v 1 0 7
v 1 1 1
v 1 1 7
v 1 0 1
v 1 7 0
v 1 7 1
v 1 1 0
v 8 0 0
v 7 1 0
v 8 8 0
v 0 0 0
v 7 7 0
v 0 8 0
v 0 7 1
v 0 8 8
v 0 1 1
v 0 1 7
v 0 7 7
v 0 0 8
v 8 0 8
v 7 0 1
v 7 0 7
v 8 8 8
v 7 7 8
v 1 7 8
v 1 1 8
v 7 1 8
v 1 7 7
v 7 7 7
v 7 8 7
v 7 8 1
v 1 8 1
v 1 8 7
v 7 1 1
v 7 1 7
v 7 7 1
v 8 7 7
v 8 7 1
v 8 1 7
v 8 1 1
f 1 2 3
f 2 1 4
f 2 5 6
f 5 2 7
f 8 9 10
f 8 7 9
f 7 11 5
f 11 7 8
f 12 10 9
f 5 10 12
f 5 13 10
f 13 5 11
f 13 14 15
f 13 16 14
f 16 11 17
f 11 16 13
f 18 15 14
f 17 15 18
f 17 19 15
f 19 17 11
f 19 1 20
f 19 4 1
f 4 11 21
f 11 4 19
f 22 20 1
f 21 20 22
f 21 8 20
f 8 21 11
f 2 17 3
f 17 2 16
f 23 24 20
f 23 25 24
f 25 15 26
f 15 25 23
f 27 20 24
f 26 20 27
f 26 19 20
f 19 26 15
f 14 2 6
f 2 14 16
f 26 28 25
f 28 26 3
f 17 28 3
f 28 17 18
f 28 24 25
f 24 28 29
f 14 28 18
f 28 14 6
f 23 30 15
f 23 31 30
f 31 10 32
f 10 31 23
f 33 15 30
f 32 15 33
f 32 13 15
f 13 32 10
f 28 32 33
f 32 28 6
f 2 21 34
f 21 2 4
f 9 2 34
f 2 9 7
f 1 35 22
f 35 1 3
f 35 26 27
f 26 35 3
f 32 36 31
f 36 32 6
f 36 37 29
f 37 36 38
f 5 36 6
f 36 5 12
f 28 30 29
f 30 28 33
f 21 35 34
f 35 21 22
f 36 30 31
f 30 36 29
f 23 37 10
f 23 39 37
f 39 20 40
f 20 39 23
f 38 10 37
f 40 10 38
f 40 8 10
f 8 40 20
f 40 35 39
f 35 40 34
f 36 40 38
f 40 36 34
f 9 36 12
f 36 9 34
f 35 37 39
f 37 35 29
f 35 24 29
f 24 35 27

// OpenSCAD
union() {
    translate([0.0, 0.0, 0.0]) cube([1, 1, 1]);
    translate([0.0, 0.0, 1.0]) cube([1, 1, 1]);
    translate([0.0, 0.0, 2.0]) cube([1, 1, 1]);
    translate([0.0, 0.0, 3.0]) cube([1, 1, 1]);
    translate([0.0, 0.0, 4.0]) cube([1, 1, 1]);
    translate([0.0, 0.0, 5.0]) cube([1, 1, 1]);
    translate([0.0, 0.0, 6.0]) cube([1, 1, 1]);
    translate([0.0, 0.0, 7.0]) cube([1, 1, 1]);
    translate([0.0, 1.0, 0.0]) cube([1, 1, 1]);
    translate([0.0, 1.0, 7.0]) cube([1, 1, 1]);
    translate([0.0, 2.0, 0.0]) cube([1, 1, 1]);
    translate([0.0, 2.0, 7.0]) cube([1, 1, 1]);
    translate([0.0, 3.0, 0.0]) cube([1, 1, 1]);
    translate([0.0, 3.0, 7.0]) cube([1, 1, 1]);
    translate([0.0, 4.0, 0.0]) cube([1, 1, 1]);
    translate([0.0, 4.0, 7.0]) cube([1, 1, 1]);
    translate([0.0, 5.0, 0.0]) cube([1, 1, 1]);
    translate([0.0, 5.0, 7.0]) cube([1, 1, 1]);
    translate([0.0, 6.0, 0.0]) cube([1, 1, 1]);
    translate([0.0, 6.0, 7.0]) cube([1, 1, 1]);
    translate([0.0, 7.0, 0.0]) cube([1, 1, 1]);
    translate([0.0, 7.0, 1.0]) cube([1, 1, 1]);
    translate([0.0, 7.0, 2.0]) cube([1, 1, 1]);
    translate([0.0, 7.0, 3.0]) cube([1, 1, 1]);
    translate([0.0, 7.0, 4.0]) cube([1, 1, 1]);
    translate([0.0, 7.0, 5.0]) cube([1, 1, 1]);
    translate([0.0, 7.0, 6.0]) cube([1, 1, 1]);
    translate([0.0, 7.0, 7.0]) cube([1, 1, 1]);
    translate([1.0, 0.0, 0.0]) cube([1, 1, 1]);
    translate([1.0, 0.0, 7.0]) cube([1, 1, 1]);
    translate([1.0, 7.0, 0.0]) cube([1, 1, 1]);
    translate([1.0, 7.0, 7.0]) cube([1, 1, 1]);
    translate([2.0, 0.0, 0.0]) cube([1, 1, 1]);
    translate([2.0, 0.0, 7.0]) cube([1, 1, 1]);
    translate([2.0, 7.0, 0.0]) cube([1, 1, 1]);
    translate([2.0, 7.0, 7.0]) cube([1, 1, 1]);
    translate([3.0, 0.0, 0.0]) cube([1, 1, 1]);
    translate([3.0, 0.0, 7.0]) cube([1, 1, 1]);
    translate([3.0, 7.0, 0.0]) cube([1, 1, 1]);
    translate([3.0, 7.0, 7.0]) cube([1, 1, 1]);
    translate([4.0, 0.0, 0.0]) cube([1, 1, 1]);
    translate([4.0, 0.0, 7.0]) cube([1, 1, 1]);
    translate([4.0, 7.0, 0.0]) cube([1, 1, 1]);
    translate([4.0, 7.0, 7.0]) cube([1, 1, 1]);
    translate([5.0, 0.0, 0.0]) cube([1, 1, 1]);
    translate([5.0, 0.0, 7.0]) cube([1, 1, 1]);
    translate([5.0, 7.0, 0.0]) cube([1, 1, 1]);
    translate([5.0, 7.0, 7.0]) cube([1, 1, 1]);
    translate([6.0, 0.0, 0.0]) cube([1, 1, 1]);
    translate([6.0, 0.0, 7.0]) cube([1, 1, 1]);
    translate([6.0, 7.0, 0.0]) cube([1, 1, 1]);
    translate([6.0, 7.0, 7.0]) cube([1, 1, 1]);
    translate([7.0, 0.0, 0.0]) cube([1, 1, 1]);
    translate([7.0, 0.0, 1.0]) cube([1, 1, 1]);
    translate([7.0, 0.0, 2.0]) cube([1, 1, 1]);
    translate([7.0, 0.0, 3.0]) cube([1, 1, 1]);
    translate([7.0, 0.0, 4.0]) cube([1, 1, 1]);
    translate([7.0, 0.0, 5.0]) cube([1, 1, 1]);
    translate([7.0, 0.0, 6.0]) cube([1, 1, 1]);
    translate([7.0, 0.0, 7.0]) cube([1, 1, 1]);
    translate([7.0, 1.0, 0.0]) cube([1, 1, 1]);
    translate([7.0, 1.0, 7.0]) cube([1, 1, 1]);
    translate([7.0, 2.0, 0.0]) cube([1, 1, 1]);
    translate([7.0, 2.0, 7.0]) cube([1, 1, 1]);
    translate([7.0, 3.0, 0.0]) cube([1, 1, 1]);
    translate([7.0, 3.0, 7.0]) cube([1, 1, 1]);
    translate([7.0, 4.0, 0.0]) cube([1, 1, 1]);
    translate([7.0, 4.0, 7.0]) cube([1, 1, 1]);
    translate([7.0, 5.0, 0.0]) cube([1, 1, 1]);
    translate([7.0, 5.0, 7.0]) cube([1, 1, 1]);
    translate([7.0, 6.0, 0.0]) cube([1, 1, 1]);
    translate([7.0, 6.0, 7.0]) cube([1, 1, 1]);
    translate([7.0, 7.0, 0.0]) cube([1, 1, 1]);
    translate([7.0, 7.0, 1.0]) cube([1, 1, 1]);
    translate([7.0, 7.0, 2.0]) cube([1, 1, 1]);
    translate([7.0, 7.0, 3.0]) cube([1, 1, 1]);
    translate([7.0, 7.0, 4.0]) cube([1, 1, 1]);
    translate([7.0, 7.0, 5.0]) cube([1, 1, 1]);
    translate([7.0, 7.0, 6.0]) cube([1, 1, 1]);
    translate([7.0, 7.0, 7.0]) cube([1, 1, 1]);
}
